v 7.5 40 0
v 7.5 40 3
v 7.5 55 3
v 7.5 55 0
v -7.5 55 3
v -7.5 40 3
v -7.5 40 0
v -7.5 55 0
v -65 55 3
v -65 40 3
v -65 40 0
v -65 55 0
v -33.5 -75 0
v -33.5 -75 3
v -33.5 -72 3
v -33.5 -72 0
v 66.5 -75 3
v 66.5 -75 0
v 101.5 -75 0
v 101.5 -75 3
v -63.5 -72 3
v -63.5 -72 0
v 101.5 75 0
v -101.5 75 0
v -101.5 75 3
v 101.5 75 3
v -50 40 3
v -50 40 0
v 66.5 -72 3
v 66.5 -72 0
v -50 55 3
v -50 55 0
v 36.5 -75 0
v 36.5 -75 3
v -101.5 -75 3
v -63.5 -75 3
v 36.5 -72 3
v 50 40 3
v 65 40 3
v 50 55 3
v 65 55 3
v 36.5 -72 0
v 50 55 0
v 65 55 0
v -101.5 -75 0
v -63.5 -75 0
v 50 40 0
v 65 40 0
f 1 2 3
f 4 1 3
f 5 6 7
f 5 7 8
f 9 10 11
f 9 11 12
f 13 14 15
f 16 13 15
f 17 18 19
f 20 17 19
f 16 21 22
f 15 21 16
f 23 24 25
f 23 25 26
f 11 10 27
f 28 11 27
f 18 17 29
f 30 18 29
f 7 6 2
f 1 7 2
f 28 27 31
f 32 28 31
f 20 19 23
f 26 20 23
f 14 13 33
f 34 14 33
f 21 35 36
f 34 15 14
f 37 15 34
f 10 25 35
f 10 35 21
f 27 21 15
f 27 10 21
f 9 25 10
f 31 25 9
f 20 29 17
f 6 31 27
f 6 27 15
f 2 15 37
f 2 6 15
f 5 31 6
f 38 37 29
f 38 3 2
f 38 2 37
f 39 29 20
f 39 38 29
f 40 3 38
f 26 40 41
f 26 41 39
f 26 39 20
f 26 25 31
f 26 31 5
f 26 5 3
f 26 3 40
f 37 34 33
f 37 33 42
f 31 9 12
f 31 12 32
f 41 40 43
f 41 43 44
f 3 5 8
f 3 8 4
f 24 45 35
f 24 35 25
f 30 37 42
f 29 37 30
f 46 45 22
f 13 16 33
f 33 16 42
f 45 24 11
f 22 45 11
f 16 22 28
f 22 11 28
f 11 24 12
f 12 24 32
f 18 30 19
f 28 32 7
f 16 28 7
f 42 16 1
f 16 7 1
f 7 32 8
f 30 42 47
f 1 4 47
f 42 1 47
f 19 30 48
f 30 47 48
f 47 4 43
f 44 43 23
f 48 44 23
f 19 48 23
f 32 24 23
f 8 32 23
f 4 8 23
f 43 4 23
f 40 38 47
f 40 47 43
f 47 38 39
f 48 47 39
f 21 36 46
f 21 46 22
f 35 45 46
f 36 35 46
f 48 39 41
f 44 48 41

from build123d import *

# Parameters (mm, degrees)
SKETCH1_W           = 203
SKETCH1_H           = 150
BOSS_EXTRUDE1_DEPTH = 3
SKETCH2_W           = 15
SKETCH2_H           = 15
CUT_EXTRUDE1_DEPTH  = 127.238860895
SKETCH3_W           = 30
SKETCH3_H           = 3
CUT_EXTRUDE2_DEPTH  = 10


with BuildPart() as part:
    # Sketch1 → Boss-Extrude1 (new body)
    with BuildSketch(Plane.XY):
        Rectangle(SKETCH1_W, SKETCH1_H)
    extrude(amount=BOSS_EXTRUDE1_DEPTH)

    # Sketch2 → Cut-Extrude1 (cut, through all)
    with BuildSketch(Plane.XY.offset(3)):
        with Locations((-57.5, 47.5)):
            Rectangle(SKETCH2_W, SKETCH2_H)
        with Locations((57.5, 47.5)):
            Rectangle(SKETCH2_W, SKETCH2_H)
        with Locations((0, 47.5)):
            Rectangle(SKETCH2_W, SKETCH2_H)
    extrude(amount=-CUT_EXTRUDE1_DEPTH, mode=Mode.SUBTRACT)

    # Sketch3 → Cut-Extrude2 (cut)
    with BuildSketch(Plane.XY.offset(3)):
        with Locations((-48.5, -73.5)):
            Rectangle(SKETCH3_W, SKETCH3_H)
        with Locations((51.5, -73.5)):
            Rectangle(SKETCH3_W, SKETCH3_H)
    extrude(amount=-CUT_EXTRUDE2_DEPTH, mode=Mode.SUBTRACT)


solid = part.part
